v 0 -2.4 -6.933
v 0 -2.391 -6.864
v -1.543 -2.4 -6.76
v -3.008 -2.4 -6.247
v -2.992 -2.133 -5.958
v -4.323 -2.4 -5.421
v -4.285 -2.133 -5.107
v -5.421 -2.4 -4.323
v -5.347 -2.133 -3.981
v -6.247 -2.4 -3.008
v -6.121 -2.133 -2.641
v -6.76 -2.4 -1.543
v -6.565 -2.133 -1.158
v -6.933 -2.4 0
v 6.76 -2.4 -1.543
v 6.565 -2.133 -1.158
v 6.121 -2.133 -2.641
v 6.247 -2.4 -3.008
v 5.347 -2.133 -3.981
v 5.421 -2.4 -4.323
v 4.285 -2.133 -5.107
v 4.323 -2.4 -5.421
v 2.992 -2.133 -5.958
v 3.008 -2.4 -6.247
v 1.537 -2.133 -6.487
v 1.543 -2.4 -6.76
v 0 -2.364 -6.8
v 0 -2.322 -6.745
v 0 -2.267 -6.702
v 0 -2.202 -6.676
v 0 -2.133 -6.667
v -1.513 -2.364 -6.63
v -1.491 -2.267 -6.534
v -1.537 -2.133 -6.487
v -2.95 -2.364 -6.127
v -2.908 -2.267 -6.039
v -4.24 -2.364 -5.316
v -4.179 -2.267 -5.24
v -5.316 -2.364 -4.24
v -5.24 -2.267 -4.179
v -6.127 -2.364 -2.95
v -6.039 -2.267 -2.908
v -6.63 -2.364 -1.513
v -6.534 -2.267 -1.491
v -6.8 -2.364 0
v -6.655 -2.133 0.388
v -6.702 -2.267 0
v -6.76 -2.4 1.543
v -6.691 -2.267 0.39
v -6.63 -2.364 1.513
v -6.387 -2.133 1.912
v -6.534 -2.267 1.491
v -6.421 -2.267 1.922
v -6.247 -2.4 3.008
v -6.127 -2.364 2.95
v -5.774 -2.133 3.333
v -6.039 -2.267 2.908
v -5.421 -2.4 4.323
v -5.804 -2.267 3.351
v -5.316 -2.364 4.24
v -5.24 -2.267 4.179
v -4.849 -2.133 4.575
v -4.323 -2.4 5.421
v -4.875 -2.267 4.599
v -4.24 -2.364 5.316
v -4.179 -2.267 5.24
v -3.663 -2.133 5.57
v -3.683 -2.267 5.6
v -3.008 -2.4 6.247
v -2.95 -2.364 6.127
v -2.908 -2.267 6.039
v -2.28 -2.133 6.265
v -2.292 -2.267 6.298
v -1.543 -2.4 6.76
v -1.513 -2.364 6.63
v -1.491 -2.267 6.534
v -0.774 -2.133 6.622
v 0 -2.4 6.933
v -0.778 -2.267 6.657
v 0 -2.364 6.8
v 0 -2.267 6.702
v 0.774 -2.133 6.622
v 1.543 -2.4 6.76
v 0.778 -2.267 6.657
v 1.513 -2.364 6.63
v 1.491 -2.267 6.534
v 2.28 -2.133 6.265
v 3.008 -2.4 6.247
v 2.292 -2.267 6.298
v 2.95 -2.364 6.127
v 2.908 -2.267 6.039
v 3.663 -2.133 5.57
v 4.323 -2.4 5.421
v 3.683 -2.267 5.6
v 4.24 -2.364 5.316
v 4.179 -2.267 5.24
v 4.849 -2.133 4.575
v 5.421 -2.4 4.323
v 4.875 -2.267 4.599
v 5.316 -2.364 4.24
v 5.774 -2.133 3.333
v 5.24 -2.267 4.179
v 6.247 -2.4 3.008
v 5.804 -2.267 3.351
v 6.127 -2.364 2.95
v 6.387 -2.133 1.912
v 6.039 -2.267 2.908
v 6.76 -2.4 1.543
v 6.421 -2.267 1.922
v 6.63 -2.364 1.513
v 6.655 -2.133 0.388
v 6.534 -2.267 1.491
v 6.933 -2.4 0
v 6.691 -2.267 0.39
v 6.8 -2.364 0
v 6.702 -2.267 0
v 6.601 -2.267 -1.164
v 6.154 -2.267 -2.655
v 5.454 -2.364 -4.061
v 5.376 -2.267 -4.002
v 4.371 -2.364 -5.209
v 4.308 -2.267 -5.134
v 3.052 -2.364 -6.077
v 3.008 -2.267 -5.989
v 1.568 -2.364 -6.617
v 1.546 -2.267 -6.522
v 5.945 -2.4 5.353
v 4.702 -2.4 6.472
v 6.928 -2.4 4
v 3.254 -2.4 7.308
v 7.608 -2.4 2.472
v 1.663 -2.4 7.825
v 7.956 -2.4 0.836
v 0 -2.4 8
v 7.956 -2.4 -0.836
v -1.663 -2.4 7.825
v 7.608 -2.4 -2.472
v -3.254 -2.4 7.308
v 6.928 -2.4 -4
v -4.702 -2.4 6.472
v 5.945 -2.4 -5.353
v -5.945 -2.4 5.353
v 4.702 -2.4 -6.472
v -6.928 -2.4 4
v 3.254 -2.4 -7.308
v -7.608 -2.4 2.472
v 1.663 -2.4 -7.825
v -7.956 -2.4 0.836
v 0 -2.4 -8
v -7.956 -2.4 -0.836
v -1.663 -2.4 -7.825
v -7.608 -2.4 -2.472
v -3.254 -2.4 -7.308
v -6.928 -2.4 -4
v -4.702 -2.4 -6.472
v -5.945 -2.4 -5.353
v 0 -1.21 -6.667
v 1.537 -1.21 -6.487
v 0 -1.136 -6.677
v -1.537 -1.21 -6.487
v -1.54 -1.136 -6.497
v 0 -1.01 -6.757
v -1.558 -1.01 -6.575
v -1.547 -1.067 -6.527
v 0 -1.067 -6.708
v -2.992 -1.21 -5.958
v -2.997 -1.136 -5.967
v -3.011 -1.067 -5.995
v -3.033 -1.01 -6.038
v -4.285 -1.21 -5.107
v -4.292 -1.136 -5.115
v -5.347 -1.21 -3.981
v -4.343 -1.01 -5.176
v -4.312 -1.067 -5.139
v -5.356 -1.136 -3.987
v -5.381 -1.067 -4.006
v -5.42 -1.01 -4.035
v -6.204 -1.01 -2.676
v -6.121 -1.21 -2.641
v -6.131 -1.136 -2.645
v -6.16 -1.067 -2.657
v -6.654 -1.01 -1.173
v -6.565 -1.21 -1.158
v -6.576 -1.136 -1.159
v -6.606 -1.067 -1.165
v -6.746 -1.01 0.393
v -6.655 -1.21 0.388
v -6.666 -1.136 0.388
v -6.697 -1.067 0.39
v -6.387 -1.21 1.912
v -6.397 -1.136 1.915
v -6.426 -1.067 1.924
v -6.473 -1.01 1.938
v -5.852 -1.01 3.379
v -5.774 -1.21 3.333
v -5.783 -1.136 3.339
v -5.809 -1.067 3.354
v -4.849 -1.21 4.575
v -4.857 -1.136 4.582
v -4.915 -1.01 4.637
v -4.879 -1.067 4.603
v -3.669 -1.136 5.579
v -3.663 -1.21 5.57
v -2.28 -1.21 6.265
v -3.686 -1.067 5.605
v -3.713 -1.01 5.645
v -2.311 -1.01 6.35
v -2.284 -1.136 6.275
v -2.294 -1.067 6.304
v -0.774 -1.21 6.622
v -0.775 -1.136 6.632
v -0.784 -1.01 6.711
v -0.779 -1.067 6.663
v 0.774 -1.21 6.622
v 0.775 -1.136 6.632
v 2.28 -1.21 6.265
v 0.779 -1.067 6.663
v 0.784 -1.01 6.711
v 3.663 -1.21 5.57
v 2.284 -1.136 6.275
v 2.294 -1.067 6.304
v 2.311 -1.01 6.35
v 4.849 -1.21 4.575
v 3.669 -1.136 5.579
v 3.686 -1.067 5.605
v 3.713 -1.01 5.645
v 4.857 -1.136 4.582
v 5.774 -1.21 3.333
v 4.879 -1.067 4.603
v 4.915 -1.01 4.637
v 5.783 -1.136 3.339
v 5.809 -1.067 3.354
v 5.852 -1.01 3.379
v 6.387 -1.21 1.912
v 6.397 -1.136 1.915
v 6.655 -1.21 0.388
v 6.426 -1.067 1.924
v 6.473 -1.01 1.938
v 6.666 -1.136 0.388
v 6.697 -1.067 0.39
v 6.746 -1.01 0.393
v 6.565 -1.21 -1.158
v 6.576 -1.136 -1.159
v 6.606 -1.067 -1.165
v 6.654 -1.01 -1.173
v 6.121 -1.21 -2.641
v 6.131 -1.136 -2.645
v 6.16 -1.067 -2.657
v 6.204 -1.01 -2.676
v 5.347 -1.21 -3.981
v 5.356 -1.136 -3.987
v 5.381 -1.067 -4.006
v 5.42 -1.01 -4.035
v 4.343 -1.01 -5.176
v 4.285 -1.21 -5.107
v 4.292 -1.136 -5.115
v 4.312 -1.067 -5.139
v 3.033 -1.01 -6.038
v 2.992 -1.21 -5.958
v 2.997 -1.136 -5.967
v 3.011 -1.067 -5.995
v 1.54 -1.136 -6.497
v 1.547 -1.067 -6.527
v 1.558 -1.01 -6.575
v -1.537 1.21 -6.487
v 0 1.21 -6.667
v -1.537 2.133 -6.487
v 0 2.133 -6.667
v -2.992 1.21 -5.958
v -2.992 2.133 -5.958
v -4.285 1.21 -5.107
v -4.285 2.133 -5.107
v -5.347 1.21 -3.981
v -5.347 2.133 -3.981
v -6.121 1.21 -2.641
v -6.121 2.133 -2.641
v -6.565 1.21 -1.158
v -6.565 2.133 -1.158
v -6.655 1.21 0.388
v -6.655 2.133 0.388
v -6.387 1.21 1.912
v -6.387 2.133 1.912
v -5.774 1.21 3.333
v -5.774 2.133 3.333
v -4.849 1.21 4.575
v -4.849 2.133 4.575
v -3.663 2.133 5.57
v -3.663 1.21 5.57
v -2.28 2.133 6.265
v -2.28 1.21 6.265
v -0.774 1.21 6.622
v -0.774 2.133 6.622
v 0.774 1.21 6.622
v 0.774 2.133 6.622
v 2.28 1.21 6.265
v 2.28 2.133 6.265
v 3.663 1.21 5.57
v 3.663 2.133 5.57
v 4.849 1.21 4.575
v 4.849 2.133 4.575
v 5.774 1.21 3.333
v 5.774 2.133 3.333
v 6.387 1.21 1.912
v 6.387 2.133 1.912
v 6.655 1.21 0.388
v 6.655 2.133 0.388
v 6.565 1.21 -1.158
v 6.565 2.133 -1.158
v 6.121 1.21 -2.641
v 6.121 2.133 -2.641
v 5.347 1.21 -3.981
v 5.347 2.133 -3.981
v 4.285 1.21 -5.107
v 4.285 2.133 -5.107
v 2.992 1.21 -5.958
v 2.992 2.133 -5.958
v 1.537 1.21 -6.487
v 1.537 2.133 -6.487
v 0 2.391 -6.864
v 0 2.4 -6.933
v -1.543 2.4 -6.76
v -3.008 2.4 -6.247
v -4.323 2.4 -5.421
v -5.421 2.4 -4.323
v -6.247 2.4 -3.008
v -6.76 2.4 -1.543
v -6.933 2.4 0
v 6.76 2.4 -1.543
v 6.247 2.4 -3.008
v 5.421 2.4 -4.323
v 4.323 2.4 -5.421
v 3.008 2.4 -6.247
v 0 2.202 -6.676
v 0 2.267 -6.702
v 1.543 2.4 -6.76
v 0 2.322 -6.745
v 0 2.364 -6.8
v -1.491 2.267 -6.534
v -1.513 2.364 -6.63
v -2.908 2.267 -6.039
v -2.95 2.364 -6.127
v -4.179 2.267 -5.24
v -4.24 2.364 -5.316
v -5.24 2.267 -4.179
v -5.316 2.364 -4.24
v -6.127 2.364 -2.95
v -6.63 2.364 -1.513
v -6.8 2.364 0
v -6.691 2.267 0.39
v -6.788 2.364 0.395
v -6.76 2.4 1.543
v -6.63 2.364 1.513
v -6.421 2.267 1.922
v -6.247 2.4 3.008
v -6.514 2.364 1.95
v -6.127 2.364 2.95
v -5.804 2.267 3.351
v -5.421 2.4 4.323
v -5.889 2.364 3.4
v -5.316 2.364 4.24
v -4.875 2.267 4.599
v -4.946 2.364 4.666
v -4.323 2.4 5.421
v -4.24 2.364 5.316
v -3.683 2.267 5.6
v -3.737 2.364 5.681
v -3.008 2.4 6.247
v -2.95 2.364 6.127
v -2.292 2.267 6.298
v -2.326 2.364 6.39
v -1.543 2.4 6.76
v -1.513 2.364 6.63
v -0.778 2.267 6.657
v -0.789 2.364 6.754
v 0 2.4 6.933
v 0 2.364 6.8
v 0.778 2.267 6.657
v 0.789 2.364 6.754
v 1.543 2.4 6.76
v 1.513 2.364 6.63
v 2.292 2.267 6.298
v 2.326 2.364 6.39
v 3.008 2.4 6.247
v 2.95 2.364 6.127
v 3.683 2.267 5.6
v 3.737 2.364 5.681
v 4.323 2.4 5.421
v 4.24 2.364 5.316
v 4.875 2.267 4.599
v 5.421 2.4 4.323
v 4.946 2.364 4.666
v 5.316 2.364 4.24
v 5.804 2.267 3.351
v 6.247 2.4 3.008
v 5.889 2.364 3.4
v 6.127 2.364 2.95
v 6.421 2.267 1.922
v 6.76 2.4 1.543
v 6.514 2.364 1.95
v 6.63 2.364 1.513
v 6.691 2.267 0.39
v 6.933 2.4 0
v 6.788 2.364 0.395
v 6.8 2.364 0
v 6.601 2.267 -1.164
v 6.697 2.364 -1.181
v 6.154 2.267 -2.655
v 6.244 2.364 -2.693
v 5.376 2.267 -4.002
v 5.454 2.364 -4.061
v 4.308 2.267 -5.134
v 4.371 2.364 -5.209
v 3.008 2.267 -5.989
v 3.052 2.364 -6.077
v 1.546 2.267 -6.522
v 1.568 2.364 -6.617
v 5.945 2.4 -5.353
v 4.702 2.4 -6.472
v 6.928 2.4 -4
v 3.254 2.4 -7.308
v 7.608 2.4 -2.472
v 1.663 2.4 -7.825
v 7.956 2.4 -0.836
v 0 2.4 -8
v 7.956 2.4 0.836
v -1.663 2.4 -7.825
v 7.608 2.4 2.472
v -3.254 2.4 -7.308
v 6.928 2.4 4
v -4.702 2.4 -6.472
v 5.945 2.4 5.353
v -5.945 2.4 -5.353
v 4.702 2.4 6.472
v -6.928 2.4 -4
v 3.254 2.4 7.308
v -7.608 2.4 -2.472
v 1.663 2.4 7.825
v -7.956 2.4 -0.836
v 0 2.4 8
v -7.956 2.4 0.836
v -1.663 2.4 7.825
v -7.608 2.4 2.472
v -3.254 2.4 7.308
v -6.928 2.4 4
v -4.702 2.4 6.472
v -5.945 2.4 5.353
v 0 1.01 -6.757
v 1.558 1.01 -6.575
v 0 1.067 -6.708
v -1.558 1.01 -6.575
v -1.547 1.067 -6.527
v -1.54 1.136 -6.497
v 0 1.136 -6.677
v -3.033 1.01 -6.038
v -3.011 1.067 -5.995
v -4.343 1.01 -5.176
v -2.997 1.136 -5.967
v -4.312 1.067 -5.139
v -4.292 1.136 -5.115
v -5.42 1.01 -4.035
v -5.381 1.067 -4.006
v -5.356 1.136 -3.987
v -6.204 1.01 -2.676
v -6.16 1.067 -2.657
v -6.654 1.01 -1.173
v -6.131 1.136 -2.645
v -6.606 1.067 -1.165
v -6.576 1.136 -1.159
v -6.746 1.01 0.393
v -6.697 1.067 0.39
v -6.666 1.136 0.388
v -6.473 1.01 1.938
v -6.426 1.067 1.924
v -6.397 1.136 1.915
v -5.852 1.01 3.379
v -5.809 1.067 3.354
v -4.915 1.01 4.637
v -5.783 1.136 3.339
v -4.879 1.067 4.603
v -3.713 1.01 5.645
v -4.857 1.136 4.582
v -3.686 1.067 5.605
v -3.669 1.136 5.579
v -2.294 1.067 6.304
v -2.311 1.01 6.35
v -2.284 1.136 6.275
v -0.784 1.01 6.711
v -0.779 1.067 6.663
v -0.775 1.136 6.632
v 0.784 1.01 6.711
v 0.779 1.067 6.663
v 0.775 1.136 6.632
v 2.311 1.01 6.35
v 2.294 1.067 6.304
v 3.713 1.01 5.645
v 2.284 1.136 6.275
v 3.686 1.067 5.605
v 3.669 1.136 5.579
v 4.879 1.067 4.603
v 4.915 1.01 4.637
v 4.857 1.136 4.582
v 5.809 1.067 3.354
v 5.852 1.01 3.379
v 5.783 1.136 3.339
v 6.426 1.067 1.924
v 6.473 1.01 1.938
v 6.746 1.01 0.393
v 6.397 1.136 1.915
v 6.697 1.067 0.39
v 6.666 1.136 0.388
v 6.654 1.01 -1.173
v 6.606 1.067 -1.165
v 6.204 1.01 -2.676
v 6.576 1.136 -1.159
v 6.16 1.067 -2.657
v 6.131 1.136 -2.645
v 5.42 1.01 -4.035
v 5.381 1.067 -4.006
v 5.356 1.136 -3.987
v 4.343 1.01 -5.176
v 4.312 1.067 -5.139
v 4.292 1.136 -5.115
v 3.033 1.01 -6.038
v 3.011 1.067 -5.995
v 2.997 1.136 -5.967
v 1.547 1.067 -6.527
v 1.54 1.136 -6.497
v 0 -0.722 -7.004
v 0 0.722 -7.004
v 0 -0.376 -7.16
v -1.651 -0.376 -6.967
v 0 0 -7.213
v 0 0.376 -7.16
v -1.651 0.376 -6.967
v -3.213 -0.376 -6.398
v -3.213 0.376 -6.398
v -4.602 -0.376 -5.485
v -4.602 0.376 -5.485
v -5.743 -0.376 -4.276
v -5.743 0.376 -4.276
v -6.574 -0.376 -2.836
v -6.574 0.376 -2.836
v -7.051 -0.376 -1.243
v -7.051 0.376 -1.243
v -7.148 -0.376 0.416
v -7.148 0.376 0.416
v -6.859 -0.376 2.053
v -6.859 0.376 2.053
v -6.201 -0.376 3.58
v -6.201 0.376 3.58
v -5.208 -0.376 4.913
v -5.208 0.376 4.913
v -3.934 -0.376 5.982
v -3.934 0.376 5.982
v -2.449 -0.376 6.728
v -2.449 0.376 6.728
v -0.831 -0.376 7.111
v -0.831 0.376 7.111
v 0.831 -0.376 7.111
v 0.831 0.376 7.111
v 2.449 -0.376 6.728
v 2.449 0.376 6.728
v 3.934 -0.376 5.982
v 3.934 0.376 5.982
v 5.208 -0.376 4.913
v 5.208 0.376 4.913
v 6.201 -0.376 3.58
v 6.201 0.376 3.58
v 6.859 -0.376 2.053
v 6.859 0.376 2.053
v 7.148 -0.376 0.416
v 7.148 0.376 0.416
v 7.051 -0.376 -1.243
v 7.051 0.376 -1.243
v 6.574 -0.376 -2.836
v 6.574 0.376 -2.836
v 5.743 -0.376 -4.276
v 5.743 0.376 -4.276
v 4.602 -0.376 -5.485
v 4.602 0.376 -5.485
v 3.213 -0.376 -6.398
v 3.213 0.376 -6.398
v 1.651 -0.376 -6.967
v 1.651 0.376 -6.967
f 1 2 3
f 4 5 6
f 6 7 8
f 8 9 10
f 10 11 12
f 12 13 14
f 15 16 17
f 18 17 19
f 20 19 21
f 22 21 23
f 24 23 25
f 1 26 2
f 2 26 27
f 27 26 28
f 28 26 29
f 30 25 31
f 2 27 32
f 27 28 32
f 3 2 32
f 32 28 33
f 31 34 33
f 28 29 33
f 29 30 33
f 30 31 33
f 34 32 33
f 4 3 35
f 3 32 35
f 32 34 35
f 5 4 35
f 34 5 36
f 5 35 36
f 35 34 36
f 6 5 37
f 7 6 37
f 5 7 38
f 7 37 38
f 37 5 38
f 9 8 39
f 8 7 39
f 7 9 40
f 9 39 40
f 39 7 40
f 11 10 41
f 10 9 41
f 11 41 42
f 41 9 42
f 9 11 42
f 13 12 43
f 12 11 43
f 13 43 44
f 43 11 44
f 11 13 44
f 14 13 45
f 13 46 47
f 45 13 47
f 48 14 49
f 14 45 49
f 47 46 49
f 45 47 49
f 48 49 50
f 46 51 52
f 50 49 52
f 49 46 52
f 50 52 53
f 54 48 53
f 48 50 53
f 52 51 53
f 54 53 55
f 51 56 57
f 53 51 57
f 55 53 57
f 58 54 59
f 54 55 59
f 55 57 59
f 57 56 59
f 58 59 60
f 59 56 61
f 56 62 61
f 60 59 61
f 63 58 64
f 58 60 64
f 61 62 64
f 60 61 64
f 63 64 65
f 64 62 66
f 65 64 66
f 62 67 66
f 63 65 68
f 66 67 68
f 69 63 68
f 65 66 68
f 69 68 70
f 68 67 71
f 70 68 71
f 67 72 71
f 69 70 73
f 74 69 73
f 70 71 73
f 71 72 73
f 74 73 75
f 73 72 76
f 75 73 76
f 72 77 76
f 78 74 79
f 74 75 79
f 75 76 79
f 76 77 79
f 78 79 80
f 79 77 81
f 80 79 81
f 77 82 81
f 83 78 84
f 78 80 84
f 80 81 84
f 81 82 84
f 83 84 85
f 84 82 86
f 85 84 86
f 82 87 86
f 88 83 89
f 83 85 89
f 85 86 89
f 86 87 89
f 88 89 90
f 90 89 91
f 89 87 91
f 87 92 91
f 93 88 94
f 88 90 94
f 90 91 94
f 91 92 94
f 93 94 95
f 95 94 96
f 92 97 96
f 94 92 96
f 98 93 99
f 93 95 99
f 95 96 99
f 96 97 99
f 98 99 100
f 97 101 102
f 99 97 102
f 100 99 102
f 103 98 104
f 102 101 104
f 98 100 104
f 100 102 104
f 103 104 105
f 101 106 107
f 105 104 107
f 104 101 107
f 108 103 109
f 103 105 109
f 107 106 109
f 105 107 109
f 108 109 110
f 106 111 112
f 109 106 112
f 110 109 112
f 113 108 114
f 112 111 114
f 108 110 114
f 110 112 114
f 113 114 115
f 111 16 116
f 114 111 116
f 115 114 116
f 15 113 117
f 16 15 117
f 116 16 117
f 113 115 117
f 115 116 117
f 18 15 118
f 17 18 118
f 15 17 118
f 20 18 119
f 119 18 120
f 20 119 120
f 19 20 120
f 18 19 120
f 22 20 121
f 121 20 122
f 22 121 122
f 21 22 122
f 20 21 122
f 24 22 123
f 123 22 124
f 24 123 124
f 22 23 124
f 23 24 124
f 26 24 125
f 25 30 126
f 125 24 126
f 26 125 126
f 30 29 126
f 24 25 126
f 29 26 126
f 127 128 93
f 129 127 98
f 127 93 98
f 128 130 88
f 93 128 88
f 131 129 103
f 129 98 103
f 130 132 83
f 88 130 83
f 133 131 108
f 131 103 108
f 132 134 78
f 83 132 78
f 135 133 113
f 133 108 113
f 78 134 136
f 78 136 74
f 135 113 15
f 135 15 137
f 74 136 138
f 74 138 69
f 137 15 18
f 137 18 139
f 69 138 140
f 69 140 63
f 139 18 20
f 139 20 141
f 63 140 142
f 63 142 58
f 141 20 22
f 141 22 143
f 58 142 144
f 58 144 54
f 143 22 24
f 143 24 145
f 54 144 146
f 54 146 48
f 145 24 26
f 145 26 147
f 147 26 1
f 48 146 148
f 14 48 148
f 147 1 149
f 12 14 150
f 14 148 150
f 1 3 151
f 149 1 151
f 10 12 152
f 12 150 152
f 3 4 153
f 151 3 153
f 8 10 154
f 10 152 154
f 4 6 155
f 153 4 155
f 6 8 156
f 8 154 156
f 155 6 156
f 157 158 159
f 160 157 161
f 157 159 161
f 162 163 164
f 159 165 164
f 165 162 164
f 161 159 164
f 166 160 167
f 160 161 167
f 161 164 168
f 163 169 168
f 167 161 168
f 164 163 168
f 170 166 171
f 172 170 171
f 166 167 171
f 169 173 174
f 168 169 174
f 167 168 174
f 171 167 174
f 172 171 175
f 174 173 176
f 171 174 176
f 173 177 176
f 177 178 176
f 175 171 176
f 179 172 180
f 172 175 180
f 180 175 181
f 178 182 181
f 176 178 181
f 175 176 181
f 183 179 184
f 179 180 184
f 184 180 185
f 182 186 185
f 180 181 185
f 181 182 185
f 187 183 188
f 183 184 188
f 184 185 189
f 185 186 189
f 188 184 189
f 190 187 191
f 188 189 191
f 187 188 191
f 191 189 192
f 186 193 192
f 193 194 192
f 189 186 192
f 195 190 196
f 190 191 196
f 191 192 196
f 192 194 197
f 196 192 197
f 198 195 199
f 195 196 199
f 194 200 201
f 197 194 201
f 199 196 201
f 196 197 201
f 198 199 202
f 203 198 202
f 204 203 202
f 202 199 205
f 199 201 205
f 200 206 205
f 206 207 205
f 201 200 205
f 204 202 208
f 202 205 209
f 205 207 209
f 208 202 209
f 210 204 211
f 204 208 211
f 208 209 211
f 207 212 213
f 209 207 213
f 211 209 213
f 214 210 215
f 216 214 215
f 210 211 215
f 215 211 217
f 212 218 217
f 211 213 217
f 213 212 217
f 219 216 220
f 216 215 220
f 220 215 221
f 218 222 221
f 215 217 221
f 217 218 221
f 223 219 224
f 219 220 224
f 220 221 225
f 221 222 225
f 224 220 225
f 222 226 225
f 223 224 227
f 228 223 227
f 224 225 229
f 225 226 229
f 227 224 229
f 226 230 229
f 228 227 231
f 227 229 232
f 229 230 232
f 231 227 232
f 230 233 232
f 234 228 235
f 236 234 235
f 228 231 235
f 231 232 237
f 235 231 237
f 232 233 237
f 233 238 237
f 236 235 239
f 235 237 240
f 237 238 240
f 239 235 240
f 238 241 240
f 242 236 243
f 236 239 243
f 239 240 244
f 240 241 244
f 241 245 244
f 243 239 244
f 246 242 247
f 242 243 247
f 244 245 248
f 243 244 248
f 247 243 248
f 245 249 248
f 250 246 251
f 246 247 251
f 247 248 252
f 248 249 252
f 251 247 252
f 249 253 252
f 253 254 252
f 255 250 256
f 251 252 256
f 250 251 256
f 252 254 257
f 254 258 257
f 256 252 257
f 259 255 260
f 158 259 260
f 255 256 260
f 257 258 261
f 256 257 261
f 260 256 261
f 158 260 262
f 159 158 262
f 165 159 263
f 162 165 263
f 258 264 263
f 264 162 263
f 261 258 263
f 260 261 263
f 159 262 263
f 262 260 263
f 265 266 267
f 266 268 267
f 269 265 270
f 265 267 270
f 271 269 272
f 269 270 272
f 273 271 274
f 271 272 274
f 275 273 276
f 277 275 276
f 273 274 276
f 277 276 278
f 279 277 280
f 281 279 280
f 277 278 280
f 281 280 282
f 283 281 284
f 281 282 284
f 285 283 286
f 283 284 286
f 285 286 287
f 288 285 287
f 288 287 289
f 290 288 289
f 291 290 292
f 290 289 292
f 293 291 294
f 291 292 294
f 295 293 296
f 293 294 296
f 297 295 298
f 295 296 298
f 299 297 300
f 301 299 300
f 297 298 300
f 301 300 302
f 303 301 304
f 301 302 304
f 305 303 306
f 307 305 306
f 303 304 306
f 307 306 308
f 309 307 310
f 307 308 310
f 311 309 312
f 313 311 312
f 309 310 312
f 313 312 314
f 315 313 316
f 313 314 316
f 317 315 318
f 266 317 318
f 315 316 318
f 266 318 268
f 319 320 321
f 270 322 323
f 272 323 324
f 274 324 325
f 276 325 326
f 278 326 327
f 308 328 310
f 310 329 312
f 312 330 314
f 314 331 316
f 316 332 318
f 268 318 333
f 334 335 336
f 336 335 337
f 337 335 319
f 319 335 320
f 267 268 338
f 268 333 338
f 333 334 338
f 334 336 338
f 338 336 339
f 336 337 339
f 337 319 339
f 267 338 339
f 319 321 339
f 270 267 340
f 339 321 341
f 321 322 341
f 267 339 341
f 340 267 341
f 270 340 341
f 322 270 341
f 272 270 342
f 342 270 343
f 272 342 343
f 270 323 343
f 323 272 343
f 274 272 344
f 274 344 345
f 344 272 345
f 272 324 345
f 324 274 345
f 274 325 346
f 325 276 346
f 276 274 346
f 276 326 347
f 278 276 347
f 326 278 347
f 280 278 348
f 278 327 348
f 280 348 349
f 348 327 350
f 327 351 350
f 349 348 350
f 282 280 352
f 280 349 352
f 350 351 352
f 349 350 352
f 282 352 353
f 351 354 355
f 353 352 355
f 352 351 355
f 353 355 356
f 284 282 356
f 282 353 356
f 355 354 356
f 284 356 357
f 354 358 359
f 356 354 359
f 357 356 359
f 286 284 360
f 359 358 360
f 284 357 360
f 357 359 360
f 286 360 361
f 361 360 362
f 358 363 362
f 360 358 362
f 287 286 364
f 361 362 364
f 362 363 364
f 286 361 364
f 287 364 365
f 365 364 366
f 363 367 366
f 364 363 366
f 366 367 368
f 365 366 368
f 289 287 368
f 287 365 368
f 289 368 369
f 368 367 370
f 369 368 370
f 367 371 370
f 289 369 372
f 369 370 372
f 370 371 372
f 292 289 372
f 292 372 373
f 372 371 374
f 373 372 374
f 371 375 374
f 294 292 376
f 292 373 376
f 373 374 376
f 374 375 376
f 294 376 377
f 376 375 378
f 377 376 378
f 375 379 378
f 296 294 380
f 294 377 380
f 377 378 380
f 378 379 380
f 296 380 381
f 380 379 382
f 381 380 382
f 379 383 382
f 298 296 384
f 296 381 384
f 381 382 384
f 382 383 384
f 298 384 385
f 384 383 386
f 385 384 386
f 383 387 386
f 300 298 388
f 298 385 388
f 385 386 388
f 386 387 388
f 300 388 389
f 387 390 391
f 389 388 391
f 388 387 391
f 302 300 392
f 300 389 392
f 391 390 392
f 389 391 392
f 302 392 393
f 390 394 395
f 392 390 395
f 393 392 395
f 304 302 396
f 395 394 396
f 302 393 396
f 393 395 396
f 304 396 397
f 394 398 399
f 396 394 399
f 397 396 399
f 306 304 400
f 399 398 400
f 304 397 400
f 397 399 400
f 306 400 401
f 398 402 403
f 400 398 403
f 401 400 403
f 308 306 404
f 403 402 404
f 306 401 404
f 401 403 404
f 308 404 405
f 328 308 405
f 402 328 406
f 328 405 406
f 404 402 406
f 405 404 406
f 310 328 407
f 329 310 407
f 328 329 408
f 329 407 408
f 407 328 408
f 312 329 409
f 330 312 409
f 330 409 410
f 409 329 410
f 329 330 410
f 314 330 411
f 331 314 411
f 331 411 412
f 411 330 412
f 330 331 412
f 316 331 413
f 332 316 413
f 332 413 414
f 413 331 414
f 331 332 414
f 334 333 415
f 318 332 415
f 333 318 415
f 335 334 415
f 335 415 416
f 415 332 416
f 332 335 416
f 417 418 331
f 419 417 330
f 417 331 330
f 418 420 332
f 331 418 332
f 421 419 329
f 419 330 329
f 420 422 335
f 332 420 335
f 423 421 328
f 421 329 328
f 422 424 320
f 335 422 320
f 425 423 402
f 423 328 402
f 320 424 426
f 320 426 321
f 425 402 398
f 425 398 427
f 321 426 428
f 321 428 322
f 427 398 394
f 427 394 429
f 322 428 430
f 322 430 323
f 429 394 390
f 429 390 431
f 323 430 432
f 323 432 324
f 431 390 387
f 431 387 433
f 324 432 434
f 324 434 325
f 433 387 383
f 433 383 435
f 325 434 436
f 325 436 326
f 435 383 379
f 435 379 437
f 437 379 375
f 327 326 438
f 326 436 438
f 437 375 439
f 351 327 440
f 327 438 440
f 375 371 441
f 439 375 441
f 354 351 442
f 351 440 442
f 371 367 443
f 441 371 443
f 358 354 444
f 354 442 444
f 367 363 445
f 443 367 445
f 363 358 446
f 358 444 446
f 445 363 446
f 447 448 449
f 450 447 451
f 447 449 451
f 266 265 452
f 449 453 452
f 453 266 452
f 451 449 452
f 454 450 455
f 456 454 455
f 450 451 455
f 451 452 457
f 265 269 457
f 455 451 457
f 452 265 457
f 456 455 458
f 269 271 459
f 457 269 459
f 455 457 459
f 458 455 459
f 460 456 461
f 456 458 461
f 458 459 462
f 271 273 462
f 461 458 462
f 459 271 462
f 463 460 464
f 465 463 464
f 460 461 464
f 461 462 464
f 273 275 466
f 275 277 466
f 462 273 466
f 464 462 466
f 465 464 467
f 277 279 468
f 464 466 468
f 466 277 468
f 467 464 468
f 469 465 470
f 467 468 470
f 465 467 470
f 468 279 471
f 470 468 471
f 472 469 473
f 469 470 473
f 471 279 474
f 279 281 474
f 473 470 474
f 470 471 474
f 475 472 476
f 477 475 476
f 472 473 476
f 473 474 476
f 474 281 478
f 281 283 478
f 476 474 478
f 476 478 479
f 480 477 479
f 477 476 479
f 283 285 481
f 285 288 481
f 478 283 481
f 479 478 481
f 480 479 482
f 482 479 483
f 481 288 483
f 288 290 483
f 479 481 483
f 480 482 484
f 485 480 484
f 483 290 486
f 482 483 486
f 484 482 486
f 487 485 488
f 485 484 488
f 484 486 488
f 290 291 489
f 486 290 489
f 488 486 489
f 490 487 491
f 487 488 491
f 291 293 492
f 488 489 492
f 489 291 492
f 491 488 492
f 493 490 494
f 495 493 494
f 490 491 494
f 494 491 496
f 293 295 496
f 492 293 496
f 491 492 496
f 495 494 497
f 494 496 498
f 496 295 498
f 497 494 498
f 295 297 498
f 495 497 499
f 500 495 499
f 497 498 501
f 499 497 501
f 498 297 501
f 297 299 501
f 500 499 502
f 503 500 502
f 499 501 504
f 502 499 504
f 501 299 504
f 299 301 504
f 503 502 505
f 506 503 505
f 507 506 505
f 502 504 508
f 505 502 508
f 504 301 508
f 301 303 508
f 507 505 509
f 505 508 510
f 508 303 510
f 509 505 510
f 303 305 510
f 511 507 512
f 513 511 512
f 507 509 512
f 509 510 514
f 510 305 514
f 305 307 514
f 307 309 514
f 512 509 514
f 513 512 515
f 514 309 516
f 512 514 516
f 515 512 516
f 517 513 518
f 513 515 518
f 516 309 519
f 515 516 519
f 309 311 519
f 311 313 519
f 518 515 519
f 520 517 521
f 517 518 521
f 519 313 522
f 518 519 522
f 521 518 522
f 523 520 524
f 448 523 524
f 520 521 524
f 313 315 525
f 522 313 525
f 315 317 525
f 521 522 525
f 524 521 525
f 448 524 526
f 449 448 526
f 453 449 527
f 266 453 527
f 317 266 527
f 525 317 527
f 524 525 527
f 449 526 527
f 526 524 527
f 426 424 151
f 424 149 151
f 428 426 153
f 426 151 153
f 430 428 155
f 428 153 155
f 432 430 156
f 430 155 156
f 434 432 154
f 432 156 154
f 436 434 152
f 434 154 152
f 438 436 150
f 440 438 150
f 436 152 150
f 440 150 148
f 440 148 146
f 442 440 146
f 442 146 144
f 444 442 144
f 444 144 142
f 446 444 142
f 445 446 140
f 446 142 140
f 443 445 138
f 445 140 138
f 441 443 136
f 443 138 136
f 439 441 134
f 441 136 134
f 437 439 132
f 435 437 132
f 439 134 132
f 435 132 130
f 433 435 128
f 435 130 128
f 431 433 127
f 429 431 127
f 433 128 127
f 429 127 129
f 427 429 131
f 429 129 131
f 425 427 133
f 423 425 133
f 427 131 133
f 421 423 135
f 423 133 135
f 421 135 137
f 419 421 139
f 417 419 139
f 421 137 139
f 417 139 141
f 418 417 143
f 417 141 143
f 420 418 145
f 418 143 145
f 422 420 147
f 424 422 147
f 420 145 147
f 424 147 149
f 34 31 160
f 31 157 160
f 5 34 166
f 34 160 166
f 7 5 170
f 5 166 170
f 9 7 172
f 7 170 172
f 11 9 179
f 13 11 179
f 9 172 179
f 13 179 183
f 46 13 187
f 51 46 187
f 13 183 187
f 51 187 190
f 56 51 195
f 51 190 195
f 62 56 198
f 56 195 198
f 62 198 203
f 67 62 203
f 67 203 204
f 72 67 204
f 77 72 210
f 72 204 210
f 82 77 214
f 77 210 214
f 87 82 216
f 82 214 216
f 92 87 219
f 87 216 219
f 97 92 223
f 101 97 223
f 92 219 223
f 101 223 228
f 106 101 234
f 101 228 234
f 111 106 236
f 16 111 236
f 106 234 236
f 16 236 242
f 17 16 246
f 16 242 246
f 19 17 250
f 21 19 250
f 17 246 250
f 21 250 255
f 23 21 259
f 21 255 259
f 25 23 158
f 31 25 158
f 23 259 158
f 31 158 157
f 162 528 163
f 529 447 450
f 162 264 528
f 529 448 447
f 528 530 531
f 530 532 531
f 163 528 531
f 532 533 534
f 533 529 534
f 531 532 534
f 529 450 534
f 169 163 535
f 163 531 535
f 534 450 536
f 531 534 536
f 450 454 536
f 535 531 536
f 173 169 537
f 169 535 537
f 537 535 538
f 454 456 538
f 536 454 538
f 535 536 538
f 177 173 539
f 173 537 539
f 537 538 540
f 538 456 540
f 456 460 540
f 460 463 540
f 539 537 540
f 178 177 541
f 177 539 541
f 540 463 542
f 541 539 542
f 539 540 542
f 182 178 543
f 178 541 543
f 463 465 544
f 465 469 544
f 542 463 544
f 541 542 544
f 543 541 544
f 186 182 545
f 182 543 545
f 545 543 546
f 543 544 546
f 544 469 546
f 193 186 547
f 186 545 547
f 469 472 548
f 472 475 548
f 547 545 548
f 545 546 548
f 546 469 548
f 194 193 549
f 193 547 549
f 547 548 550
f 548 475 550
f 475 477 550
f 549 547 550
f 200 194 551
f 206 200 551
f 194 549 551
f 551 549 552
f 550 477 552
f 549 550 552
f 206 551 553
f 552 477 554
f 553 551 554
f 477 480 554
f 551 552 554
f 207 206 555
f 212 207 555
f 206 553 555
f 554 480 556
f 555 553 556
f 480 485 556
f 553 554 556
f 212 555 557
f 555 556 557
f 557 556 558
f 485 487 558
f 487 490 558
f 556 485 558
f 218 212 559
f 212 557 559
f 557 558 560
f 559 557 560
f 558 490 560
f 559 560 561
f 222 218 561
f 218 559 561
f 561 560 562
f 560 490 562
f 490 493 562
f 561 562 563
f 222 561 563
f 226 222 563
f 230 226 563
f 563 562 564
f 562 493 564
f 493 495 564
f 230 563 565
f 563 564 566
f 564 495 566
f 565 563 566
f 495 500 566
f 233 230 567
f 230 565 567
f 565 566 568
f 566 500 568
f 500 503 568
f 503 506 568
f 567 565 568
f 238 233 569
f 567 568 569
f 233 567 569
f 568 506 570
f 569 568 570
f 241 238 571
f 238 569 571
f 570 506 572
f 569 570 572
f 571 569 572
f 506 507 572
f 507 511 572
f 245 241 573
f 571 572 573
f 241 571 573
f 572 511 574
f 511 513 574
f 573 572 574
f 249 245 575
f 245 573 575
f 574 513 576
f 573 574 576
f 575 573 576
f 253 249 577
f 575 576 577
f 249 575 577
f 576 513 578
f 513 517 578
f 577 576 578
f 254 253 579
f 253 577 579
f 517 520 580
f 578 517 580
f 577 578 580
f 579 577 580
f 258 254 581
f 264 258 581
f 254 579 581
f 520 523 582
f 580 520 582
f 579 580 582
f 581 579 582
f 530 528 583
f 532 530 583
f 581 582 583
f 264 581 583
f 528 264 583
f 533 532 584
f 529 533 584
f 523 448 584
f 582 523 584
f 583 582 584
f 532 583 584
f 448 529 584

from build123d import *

# Parameters (mm, degrees)
SCALE1_SCALE = 0.266666667


with BuildPart() as part:
    # Sketch1 → Revolve1 (revolve)
    with BuildSketch(Plane(origin=(0, 0, 0), x_dir=(0, 0, -1), z_dir=(1, 0, 0))):
        with BuildLine():
            Line((25, -8), (25, -4.538997687))
            ThreePointArc((25, -4.538997687), (25.088639197, -4.127389271), (25.338842975, -3.788750135))
            ThreePointArc((25.338842975, -3.788750135), (27.05, 0), (25.338842975, 3.788750135))
            ThreePointArc((25.338842975, 3.788750135), (25.088639197, 4.127389271), (25, 4.538997687))
            Line((25, 4.538997687), (25, 8))
            ThreePointArc((25, 8), (25.292893219, 8.707106781), (26, 9))
            Line((26, 9), (30, 9))
            Line((30, 9), (30, -9))
            Line((30, -9), (26, -9))
            ThreePointArc((26, -9), (25.292893219, -8.707106781), (25, -8))
        make_face()
    revolve(axis=Axis((0, 0, 0), (0, 1, 0)))


with BuildPart() as part_1:
    # Scale1: scaled about (0, 0, 0)
    add(part.part.scale(SCALE1_SCALE))


solid = part_1.part
